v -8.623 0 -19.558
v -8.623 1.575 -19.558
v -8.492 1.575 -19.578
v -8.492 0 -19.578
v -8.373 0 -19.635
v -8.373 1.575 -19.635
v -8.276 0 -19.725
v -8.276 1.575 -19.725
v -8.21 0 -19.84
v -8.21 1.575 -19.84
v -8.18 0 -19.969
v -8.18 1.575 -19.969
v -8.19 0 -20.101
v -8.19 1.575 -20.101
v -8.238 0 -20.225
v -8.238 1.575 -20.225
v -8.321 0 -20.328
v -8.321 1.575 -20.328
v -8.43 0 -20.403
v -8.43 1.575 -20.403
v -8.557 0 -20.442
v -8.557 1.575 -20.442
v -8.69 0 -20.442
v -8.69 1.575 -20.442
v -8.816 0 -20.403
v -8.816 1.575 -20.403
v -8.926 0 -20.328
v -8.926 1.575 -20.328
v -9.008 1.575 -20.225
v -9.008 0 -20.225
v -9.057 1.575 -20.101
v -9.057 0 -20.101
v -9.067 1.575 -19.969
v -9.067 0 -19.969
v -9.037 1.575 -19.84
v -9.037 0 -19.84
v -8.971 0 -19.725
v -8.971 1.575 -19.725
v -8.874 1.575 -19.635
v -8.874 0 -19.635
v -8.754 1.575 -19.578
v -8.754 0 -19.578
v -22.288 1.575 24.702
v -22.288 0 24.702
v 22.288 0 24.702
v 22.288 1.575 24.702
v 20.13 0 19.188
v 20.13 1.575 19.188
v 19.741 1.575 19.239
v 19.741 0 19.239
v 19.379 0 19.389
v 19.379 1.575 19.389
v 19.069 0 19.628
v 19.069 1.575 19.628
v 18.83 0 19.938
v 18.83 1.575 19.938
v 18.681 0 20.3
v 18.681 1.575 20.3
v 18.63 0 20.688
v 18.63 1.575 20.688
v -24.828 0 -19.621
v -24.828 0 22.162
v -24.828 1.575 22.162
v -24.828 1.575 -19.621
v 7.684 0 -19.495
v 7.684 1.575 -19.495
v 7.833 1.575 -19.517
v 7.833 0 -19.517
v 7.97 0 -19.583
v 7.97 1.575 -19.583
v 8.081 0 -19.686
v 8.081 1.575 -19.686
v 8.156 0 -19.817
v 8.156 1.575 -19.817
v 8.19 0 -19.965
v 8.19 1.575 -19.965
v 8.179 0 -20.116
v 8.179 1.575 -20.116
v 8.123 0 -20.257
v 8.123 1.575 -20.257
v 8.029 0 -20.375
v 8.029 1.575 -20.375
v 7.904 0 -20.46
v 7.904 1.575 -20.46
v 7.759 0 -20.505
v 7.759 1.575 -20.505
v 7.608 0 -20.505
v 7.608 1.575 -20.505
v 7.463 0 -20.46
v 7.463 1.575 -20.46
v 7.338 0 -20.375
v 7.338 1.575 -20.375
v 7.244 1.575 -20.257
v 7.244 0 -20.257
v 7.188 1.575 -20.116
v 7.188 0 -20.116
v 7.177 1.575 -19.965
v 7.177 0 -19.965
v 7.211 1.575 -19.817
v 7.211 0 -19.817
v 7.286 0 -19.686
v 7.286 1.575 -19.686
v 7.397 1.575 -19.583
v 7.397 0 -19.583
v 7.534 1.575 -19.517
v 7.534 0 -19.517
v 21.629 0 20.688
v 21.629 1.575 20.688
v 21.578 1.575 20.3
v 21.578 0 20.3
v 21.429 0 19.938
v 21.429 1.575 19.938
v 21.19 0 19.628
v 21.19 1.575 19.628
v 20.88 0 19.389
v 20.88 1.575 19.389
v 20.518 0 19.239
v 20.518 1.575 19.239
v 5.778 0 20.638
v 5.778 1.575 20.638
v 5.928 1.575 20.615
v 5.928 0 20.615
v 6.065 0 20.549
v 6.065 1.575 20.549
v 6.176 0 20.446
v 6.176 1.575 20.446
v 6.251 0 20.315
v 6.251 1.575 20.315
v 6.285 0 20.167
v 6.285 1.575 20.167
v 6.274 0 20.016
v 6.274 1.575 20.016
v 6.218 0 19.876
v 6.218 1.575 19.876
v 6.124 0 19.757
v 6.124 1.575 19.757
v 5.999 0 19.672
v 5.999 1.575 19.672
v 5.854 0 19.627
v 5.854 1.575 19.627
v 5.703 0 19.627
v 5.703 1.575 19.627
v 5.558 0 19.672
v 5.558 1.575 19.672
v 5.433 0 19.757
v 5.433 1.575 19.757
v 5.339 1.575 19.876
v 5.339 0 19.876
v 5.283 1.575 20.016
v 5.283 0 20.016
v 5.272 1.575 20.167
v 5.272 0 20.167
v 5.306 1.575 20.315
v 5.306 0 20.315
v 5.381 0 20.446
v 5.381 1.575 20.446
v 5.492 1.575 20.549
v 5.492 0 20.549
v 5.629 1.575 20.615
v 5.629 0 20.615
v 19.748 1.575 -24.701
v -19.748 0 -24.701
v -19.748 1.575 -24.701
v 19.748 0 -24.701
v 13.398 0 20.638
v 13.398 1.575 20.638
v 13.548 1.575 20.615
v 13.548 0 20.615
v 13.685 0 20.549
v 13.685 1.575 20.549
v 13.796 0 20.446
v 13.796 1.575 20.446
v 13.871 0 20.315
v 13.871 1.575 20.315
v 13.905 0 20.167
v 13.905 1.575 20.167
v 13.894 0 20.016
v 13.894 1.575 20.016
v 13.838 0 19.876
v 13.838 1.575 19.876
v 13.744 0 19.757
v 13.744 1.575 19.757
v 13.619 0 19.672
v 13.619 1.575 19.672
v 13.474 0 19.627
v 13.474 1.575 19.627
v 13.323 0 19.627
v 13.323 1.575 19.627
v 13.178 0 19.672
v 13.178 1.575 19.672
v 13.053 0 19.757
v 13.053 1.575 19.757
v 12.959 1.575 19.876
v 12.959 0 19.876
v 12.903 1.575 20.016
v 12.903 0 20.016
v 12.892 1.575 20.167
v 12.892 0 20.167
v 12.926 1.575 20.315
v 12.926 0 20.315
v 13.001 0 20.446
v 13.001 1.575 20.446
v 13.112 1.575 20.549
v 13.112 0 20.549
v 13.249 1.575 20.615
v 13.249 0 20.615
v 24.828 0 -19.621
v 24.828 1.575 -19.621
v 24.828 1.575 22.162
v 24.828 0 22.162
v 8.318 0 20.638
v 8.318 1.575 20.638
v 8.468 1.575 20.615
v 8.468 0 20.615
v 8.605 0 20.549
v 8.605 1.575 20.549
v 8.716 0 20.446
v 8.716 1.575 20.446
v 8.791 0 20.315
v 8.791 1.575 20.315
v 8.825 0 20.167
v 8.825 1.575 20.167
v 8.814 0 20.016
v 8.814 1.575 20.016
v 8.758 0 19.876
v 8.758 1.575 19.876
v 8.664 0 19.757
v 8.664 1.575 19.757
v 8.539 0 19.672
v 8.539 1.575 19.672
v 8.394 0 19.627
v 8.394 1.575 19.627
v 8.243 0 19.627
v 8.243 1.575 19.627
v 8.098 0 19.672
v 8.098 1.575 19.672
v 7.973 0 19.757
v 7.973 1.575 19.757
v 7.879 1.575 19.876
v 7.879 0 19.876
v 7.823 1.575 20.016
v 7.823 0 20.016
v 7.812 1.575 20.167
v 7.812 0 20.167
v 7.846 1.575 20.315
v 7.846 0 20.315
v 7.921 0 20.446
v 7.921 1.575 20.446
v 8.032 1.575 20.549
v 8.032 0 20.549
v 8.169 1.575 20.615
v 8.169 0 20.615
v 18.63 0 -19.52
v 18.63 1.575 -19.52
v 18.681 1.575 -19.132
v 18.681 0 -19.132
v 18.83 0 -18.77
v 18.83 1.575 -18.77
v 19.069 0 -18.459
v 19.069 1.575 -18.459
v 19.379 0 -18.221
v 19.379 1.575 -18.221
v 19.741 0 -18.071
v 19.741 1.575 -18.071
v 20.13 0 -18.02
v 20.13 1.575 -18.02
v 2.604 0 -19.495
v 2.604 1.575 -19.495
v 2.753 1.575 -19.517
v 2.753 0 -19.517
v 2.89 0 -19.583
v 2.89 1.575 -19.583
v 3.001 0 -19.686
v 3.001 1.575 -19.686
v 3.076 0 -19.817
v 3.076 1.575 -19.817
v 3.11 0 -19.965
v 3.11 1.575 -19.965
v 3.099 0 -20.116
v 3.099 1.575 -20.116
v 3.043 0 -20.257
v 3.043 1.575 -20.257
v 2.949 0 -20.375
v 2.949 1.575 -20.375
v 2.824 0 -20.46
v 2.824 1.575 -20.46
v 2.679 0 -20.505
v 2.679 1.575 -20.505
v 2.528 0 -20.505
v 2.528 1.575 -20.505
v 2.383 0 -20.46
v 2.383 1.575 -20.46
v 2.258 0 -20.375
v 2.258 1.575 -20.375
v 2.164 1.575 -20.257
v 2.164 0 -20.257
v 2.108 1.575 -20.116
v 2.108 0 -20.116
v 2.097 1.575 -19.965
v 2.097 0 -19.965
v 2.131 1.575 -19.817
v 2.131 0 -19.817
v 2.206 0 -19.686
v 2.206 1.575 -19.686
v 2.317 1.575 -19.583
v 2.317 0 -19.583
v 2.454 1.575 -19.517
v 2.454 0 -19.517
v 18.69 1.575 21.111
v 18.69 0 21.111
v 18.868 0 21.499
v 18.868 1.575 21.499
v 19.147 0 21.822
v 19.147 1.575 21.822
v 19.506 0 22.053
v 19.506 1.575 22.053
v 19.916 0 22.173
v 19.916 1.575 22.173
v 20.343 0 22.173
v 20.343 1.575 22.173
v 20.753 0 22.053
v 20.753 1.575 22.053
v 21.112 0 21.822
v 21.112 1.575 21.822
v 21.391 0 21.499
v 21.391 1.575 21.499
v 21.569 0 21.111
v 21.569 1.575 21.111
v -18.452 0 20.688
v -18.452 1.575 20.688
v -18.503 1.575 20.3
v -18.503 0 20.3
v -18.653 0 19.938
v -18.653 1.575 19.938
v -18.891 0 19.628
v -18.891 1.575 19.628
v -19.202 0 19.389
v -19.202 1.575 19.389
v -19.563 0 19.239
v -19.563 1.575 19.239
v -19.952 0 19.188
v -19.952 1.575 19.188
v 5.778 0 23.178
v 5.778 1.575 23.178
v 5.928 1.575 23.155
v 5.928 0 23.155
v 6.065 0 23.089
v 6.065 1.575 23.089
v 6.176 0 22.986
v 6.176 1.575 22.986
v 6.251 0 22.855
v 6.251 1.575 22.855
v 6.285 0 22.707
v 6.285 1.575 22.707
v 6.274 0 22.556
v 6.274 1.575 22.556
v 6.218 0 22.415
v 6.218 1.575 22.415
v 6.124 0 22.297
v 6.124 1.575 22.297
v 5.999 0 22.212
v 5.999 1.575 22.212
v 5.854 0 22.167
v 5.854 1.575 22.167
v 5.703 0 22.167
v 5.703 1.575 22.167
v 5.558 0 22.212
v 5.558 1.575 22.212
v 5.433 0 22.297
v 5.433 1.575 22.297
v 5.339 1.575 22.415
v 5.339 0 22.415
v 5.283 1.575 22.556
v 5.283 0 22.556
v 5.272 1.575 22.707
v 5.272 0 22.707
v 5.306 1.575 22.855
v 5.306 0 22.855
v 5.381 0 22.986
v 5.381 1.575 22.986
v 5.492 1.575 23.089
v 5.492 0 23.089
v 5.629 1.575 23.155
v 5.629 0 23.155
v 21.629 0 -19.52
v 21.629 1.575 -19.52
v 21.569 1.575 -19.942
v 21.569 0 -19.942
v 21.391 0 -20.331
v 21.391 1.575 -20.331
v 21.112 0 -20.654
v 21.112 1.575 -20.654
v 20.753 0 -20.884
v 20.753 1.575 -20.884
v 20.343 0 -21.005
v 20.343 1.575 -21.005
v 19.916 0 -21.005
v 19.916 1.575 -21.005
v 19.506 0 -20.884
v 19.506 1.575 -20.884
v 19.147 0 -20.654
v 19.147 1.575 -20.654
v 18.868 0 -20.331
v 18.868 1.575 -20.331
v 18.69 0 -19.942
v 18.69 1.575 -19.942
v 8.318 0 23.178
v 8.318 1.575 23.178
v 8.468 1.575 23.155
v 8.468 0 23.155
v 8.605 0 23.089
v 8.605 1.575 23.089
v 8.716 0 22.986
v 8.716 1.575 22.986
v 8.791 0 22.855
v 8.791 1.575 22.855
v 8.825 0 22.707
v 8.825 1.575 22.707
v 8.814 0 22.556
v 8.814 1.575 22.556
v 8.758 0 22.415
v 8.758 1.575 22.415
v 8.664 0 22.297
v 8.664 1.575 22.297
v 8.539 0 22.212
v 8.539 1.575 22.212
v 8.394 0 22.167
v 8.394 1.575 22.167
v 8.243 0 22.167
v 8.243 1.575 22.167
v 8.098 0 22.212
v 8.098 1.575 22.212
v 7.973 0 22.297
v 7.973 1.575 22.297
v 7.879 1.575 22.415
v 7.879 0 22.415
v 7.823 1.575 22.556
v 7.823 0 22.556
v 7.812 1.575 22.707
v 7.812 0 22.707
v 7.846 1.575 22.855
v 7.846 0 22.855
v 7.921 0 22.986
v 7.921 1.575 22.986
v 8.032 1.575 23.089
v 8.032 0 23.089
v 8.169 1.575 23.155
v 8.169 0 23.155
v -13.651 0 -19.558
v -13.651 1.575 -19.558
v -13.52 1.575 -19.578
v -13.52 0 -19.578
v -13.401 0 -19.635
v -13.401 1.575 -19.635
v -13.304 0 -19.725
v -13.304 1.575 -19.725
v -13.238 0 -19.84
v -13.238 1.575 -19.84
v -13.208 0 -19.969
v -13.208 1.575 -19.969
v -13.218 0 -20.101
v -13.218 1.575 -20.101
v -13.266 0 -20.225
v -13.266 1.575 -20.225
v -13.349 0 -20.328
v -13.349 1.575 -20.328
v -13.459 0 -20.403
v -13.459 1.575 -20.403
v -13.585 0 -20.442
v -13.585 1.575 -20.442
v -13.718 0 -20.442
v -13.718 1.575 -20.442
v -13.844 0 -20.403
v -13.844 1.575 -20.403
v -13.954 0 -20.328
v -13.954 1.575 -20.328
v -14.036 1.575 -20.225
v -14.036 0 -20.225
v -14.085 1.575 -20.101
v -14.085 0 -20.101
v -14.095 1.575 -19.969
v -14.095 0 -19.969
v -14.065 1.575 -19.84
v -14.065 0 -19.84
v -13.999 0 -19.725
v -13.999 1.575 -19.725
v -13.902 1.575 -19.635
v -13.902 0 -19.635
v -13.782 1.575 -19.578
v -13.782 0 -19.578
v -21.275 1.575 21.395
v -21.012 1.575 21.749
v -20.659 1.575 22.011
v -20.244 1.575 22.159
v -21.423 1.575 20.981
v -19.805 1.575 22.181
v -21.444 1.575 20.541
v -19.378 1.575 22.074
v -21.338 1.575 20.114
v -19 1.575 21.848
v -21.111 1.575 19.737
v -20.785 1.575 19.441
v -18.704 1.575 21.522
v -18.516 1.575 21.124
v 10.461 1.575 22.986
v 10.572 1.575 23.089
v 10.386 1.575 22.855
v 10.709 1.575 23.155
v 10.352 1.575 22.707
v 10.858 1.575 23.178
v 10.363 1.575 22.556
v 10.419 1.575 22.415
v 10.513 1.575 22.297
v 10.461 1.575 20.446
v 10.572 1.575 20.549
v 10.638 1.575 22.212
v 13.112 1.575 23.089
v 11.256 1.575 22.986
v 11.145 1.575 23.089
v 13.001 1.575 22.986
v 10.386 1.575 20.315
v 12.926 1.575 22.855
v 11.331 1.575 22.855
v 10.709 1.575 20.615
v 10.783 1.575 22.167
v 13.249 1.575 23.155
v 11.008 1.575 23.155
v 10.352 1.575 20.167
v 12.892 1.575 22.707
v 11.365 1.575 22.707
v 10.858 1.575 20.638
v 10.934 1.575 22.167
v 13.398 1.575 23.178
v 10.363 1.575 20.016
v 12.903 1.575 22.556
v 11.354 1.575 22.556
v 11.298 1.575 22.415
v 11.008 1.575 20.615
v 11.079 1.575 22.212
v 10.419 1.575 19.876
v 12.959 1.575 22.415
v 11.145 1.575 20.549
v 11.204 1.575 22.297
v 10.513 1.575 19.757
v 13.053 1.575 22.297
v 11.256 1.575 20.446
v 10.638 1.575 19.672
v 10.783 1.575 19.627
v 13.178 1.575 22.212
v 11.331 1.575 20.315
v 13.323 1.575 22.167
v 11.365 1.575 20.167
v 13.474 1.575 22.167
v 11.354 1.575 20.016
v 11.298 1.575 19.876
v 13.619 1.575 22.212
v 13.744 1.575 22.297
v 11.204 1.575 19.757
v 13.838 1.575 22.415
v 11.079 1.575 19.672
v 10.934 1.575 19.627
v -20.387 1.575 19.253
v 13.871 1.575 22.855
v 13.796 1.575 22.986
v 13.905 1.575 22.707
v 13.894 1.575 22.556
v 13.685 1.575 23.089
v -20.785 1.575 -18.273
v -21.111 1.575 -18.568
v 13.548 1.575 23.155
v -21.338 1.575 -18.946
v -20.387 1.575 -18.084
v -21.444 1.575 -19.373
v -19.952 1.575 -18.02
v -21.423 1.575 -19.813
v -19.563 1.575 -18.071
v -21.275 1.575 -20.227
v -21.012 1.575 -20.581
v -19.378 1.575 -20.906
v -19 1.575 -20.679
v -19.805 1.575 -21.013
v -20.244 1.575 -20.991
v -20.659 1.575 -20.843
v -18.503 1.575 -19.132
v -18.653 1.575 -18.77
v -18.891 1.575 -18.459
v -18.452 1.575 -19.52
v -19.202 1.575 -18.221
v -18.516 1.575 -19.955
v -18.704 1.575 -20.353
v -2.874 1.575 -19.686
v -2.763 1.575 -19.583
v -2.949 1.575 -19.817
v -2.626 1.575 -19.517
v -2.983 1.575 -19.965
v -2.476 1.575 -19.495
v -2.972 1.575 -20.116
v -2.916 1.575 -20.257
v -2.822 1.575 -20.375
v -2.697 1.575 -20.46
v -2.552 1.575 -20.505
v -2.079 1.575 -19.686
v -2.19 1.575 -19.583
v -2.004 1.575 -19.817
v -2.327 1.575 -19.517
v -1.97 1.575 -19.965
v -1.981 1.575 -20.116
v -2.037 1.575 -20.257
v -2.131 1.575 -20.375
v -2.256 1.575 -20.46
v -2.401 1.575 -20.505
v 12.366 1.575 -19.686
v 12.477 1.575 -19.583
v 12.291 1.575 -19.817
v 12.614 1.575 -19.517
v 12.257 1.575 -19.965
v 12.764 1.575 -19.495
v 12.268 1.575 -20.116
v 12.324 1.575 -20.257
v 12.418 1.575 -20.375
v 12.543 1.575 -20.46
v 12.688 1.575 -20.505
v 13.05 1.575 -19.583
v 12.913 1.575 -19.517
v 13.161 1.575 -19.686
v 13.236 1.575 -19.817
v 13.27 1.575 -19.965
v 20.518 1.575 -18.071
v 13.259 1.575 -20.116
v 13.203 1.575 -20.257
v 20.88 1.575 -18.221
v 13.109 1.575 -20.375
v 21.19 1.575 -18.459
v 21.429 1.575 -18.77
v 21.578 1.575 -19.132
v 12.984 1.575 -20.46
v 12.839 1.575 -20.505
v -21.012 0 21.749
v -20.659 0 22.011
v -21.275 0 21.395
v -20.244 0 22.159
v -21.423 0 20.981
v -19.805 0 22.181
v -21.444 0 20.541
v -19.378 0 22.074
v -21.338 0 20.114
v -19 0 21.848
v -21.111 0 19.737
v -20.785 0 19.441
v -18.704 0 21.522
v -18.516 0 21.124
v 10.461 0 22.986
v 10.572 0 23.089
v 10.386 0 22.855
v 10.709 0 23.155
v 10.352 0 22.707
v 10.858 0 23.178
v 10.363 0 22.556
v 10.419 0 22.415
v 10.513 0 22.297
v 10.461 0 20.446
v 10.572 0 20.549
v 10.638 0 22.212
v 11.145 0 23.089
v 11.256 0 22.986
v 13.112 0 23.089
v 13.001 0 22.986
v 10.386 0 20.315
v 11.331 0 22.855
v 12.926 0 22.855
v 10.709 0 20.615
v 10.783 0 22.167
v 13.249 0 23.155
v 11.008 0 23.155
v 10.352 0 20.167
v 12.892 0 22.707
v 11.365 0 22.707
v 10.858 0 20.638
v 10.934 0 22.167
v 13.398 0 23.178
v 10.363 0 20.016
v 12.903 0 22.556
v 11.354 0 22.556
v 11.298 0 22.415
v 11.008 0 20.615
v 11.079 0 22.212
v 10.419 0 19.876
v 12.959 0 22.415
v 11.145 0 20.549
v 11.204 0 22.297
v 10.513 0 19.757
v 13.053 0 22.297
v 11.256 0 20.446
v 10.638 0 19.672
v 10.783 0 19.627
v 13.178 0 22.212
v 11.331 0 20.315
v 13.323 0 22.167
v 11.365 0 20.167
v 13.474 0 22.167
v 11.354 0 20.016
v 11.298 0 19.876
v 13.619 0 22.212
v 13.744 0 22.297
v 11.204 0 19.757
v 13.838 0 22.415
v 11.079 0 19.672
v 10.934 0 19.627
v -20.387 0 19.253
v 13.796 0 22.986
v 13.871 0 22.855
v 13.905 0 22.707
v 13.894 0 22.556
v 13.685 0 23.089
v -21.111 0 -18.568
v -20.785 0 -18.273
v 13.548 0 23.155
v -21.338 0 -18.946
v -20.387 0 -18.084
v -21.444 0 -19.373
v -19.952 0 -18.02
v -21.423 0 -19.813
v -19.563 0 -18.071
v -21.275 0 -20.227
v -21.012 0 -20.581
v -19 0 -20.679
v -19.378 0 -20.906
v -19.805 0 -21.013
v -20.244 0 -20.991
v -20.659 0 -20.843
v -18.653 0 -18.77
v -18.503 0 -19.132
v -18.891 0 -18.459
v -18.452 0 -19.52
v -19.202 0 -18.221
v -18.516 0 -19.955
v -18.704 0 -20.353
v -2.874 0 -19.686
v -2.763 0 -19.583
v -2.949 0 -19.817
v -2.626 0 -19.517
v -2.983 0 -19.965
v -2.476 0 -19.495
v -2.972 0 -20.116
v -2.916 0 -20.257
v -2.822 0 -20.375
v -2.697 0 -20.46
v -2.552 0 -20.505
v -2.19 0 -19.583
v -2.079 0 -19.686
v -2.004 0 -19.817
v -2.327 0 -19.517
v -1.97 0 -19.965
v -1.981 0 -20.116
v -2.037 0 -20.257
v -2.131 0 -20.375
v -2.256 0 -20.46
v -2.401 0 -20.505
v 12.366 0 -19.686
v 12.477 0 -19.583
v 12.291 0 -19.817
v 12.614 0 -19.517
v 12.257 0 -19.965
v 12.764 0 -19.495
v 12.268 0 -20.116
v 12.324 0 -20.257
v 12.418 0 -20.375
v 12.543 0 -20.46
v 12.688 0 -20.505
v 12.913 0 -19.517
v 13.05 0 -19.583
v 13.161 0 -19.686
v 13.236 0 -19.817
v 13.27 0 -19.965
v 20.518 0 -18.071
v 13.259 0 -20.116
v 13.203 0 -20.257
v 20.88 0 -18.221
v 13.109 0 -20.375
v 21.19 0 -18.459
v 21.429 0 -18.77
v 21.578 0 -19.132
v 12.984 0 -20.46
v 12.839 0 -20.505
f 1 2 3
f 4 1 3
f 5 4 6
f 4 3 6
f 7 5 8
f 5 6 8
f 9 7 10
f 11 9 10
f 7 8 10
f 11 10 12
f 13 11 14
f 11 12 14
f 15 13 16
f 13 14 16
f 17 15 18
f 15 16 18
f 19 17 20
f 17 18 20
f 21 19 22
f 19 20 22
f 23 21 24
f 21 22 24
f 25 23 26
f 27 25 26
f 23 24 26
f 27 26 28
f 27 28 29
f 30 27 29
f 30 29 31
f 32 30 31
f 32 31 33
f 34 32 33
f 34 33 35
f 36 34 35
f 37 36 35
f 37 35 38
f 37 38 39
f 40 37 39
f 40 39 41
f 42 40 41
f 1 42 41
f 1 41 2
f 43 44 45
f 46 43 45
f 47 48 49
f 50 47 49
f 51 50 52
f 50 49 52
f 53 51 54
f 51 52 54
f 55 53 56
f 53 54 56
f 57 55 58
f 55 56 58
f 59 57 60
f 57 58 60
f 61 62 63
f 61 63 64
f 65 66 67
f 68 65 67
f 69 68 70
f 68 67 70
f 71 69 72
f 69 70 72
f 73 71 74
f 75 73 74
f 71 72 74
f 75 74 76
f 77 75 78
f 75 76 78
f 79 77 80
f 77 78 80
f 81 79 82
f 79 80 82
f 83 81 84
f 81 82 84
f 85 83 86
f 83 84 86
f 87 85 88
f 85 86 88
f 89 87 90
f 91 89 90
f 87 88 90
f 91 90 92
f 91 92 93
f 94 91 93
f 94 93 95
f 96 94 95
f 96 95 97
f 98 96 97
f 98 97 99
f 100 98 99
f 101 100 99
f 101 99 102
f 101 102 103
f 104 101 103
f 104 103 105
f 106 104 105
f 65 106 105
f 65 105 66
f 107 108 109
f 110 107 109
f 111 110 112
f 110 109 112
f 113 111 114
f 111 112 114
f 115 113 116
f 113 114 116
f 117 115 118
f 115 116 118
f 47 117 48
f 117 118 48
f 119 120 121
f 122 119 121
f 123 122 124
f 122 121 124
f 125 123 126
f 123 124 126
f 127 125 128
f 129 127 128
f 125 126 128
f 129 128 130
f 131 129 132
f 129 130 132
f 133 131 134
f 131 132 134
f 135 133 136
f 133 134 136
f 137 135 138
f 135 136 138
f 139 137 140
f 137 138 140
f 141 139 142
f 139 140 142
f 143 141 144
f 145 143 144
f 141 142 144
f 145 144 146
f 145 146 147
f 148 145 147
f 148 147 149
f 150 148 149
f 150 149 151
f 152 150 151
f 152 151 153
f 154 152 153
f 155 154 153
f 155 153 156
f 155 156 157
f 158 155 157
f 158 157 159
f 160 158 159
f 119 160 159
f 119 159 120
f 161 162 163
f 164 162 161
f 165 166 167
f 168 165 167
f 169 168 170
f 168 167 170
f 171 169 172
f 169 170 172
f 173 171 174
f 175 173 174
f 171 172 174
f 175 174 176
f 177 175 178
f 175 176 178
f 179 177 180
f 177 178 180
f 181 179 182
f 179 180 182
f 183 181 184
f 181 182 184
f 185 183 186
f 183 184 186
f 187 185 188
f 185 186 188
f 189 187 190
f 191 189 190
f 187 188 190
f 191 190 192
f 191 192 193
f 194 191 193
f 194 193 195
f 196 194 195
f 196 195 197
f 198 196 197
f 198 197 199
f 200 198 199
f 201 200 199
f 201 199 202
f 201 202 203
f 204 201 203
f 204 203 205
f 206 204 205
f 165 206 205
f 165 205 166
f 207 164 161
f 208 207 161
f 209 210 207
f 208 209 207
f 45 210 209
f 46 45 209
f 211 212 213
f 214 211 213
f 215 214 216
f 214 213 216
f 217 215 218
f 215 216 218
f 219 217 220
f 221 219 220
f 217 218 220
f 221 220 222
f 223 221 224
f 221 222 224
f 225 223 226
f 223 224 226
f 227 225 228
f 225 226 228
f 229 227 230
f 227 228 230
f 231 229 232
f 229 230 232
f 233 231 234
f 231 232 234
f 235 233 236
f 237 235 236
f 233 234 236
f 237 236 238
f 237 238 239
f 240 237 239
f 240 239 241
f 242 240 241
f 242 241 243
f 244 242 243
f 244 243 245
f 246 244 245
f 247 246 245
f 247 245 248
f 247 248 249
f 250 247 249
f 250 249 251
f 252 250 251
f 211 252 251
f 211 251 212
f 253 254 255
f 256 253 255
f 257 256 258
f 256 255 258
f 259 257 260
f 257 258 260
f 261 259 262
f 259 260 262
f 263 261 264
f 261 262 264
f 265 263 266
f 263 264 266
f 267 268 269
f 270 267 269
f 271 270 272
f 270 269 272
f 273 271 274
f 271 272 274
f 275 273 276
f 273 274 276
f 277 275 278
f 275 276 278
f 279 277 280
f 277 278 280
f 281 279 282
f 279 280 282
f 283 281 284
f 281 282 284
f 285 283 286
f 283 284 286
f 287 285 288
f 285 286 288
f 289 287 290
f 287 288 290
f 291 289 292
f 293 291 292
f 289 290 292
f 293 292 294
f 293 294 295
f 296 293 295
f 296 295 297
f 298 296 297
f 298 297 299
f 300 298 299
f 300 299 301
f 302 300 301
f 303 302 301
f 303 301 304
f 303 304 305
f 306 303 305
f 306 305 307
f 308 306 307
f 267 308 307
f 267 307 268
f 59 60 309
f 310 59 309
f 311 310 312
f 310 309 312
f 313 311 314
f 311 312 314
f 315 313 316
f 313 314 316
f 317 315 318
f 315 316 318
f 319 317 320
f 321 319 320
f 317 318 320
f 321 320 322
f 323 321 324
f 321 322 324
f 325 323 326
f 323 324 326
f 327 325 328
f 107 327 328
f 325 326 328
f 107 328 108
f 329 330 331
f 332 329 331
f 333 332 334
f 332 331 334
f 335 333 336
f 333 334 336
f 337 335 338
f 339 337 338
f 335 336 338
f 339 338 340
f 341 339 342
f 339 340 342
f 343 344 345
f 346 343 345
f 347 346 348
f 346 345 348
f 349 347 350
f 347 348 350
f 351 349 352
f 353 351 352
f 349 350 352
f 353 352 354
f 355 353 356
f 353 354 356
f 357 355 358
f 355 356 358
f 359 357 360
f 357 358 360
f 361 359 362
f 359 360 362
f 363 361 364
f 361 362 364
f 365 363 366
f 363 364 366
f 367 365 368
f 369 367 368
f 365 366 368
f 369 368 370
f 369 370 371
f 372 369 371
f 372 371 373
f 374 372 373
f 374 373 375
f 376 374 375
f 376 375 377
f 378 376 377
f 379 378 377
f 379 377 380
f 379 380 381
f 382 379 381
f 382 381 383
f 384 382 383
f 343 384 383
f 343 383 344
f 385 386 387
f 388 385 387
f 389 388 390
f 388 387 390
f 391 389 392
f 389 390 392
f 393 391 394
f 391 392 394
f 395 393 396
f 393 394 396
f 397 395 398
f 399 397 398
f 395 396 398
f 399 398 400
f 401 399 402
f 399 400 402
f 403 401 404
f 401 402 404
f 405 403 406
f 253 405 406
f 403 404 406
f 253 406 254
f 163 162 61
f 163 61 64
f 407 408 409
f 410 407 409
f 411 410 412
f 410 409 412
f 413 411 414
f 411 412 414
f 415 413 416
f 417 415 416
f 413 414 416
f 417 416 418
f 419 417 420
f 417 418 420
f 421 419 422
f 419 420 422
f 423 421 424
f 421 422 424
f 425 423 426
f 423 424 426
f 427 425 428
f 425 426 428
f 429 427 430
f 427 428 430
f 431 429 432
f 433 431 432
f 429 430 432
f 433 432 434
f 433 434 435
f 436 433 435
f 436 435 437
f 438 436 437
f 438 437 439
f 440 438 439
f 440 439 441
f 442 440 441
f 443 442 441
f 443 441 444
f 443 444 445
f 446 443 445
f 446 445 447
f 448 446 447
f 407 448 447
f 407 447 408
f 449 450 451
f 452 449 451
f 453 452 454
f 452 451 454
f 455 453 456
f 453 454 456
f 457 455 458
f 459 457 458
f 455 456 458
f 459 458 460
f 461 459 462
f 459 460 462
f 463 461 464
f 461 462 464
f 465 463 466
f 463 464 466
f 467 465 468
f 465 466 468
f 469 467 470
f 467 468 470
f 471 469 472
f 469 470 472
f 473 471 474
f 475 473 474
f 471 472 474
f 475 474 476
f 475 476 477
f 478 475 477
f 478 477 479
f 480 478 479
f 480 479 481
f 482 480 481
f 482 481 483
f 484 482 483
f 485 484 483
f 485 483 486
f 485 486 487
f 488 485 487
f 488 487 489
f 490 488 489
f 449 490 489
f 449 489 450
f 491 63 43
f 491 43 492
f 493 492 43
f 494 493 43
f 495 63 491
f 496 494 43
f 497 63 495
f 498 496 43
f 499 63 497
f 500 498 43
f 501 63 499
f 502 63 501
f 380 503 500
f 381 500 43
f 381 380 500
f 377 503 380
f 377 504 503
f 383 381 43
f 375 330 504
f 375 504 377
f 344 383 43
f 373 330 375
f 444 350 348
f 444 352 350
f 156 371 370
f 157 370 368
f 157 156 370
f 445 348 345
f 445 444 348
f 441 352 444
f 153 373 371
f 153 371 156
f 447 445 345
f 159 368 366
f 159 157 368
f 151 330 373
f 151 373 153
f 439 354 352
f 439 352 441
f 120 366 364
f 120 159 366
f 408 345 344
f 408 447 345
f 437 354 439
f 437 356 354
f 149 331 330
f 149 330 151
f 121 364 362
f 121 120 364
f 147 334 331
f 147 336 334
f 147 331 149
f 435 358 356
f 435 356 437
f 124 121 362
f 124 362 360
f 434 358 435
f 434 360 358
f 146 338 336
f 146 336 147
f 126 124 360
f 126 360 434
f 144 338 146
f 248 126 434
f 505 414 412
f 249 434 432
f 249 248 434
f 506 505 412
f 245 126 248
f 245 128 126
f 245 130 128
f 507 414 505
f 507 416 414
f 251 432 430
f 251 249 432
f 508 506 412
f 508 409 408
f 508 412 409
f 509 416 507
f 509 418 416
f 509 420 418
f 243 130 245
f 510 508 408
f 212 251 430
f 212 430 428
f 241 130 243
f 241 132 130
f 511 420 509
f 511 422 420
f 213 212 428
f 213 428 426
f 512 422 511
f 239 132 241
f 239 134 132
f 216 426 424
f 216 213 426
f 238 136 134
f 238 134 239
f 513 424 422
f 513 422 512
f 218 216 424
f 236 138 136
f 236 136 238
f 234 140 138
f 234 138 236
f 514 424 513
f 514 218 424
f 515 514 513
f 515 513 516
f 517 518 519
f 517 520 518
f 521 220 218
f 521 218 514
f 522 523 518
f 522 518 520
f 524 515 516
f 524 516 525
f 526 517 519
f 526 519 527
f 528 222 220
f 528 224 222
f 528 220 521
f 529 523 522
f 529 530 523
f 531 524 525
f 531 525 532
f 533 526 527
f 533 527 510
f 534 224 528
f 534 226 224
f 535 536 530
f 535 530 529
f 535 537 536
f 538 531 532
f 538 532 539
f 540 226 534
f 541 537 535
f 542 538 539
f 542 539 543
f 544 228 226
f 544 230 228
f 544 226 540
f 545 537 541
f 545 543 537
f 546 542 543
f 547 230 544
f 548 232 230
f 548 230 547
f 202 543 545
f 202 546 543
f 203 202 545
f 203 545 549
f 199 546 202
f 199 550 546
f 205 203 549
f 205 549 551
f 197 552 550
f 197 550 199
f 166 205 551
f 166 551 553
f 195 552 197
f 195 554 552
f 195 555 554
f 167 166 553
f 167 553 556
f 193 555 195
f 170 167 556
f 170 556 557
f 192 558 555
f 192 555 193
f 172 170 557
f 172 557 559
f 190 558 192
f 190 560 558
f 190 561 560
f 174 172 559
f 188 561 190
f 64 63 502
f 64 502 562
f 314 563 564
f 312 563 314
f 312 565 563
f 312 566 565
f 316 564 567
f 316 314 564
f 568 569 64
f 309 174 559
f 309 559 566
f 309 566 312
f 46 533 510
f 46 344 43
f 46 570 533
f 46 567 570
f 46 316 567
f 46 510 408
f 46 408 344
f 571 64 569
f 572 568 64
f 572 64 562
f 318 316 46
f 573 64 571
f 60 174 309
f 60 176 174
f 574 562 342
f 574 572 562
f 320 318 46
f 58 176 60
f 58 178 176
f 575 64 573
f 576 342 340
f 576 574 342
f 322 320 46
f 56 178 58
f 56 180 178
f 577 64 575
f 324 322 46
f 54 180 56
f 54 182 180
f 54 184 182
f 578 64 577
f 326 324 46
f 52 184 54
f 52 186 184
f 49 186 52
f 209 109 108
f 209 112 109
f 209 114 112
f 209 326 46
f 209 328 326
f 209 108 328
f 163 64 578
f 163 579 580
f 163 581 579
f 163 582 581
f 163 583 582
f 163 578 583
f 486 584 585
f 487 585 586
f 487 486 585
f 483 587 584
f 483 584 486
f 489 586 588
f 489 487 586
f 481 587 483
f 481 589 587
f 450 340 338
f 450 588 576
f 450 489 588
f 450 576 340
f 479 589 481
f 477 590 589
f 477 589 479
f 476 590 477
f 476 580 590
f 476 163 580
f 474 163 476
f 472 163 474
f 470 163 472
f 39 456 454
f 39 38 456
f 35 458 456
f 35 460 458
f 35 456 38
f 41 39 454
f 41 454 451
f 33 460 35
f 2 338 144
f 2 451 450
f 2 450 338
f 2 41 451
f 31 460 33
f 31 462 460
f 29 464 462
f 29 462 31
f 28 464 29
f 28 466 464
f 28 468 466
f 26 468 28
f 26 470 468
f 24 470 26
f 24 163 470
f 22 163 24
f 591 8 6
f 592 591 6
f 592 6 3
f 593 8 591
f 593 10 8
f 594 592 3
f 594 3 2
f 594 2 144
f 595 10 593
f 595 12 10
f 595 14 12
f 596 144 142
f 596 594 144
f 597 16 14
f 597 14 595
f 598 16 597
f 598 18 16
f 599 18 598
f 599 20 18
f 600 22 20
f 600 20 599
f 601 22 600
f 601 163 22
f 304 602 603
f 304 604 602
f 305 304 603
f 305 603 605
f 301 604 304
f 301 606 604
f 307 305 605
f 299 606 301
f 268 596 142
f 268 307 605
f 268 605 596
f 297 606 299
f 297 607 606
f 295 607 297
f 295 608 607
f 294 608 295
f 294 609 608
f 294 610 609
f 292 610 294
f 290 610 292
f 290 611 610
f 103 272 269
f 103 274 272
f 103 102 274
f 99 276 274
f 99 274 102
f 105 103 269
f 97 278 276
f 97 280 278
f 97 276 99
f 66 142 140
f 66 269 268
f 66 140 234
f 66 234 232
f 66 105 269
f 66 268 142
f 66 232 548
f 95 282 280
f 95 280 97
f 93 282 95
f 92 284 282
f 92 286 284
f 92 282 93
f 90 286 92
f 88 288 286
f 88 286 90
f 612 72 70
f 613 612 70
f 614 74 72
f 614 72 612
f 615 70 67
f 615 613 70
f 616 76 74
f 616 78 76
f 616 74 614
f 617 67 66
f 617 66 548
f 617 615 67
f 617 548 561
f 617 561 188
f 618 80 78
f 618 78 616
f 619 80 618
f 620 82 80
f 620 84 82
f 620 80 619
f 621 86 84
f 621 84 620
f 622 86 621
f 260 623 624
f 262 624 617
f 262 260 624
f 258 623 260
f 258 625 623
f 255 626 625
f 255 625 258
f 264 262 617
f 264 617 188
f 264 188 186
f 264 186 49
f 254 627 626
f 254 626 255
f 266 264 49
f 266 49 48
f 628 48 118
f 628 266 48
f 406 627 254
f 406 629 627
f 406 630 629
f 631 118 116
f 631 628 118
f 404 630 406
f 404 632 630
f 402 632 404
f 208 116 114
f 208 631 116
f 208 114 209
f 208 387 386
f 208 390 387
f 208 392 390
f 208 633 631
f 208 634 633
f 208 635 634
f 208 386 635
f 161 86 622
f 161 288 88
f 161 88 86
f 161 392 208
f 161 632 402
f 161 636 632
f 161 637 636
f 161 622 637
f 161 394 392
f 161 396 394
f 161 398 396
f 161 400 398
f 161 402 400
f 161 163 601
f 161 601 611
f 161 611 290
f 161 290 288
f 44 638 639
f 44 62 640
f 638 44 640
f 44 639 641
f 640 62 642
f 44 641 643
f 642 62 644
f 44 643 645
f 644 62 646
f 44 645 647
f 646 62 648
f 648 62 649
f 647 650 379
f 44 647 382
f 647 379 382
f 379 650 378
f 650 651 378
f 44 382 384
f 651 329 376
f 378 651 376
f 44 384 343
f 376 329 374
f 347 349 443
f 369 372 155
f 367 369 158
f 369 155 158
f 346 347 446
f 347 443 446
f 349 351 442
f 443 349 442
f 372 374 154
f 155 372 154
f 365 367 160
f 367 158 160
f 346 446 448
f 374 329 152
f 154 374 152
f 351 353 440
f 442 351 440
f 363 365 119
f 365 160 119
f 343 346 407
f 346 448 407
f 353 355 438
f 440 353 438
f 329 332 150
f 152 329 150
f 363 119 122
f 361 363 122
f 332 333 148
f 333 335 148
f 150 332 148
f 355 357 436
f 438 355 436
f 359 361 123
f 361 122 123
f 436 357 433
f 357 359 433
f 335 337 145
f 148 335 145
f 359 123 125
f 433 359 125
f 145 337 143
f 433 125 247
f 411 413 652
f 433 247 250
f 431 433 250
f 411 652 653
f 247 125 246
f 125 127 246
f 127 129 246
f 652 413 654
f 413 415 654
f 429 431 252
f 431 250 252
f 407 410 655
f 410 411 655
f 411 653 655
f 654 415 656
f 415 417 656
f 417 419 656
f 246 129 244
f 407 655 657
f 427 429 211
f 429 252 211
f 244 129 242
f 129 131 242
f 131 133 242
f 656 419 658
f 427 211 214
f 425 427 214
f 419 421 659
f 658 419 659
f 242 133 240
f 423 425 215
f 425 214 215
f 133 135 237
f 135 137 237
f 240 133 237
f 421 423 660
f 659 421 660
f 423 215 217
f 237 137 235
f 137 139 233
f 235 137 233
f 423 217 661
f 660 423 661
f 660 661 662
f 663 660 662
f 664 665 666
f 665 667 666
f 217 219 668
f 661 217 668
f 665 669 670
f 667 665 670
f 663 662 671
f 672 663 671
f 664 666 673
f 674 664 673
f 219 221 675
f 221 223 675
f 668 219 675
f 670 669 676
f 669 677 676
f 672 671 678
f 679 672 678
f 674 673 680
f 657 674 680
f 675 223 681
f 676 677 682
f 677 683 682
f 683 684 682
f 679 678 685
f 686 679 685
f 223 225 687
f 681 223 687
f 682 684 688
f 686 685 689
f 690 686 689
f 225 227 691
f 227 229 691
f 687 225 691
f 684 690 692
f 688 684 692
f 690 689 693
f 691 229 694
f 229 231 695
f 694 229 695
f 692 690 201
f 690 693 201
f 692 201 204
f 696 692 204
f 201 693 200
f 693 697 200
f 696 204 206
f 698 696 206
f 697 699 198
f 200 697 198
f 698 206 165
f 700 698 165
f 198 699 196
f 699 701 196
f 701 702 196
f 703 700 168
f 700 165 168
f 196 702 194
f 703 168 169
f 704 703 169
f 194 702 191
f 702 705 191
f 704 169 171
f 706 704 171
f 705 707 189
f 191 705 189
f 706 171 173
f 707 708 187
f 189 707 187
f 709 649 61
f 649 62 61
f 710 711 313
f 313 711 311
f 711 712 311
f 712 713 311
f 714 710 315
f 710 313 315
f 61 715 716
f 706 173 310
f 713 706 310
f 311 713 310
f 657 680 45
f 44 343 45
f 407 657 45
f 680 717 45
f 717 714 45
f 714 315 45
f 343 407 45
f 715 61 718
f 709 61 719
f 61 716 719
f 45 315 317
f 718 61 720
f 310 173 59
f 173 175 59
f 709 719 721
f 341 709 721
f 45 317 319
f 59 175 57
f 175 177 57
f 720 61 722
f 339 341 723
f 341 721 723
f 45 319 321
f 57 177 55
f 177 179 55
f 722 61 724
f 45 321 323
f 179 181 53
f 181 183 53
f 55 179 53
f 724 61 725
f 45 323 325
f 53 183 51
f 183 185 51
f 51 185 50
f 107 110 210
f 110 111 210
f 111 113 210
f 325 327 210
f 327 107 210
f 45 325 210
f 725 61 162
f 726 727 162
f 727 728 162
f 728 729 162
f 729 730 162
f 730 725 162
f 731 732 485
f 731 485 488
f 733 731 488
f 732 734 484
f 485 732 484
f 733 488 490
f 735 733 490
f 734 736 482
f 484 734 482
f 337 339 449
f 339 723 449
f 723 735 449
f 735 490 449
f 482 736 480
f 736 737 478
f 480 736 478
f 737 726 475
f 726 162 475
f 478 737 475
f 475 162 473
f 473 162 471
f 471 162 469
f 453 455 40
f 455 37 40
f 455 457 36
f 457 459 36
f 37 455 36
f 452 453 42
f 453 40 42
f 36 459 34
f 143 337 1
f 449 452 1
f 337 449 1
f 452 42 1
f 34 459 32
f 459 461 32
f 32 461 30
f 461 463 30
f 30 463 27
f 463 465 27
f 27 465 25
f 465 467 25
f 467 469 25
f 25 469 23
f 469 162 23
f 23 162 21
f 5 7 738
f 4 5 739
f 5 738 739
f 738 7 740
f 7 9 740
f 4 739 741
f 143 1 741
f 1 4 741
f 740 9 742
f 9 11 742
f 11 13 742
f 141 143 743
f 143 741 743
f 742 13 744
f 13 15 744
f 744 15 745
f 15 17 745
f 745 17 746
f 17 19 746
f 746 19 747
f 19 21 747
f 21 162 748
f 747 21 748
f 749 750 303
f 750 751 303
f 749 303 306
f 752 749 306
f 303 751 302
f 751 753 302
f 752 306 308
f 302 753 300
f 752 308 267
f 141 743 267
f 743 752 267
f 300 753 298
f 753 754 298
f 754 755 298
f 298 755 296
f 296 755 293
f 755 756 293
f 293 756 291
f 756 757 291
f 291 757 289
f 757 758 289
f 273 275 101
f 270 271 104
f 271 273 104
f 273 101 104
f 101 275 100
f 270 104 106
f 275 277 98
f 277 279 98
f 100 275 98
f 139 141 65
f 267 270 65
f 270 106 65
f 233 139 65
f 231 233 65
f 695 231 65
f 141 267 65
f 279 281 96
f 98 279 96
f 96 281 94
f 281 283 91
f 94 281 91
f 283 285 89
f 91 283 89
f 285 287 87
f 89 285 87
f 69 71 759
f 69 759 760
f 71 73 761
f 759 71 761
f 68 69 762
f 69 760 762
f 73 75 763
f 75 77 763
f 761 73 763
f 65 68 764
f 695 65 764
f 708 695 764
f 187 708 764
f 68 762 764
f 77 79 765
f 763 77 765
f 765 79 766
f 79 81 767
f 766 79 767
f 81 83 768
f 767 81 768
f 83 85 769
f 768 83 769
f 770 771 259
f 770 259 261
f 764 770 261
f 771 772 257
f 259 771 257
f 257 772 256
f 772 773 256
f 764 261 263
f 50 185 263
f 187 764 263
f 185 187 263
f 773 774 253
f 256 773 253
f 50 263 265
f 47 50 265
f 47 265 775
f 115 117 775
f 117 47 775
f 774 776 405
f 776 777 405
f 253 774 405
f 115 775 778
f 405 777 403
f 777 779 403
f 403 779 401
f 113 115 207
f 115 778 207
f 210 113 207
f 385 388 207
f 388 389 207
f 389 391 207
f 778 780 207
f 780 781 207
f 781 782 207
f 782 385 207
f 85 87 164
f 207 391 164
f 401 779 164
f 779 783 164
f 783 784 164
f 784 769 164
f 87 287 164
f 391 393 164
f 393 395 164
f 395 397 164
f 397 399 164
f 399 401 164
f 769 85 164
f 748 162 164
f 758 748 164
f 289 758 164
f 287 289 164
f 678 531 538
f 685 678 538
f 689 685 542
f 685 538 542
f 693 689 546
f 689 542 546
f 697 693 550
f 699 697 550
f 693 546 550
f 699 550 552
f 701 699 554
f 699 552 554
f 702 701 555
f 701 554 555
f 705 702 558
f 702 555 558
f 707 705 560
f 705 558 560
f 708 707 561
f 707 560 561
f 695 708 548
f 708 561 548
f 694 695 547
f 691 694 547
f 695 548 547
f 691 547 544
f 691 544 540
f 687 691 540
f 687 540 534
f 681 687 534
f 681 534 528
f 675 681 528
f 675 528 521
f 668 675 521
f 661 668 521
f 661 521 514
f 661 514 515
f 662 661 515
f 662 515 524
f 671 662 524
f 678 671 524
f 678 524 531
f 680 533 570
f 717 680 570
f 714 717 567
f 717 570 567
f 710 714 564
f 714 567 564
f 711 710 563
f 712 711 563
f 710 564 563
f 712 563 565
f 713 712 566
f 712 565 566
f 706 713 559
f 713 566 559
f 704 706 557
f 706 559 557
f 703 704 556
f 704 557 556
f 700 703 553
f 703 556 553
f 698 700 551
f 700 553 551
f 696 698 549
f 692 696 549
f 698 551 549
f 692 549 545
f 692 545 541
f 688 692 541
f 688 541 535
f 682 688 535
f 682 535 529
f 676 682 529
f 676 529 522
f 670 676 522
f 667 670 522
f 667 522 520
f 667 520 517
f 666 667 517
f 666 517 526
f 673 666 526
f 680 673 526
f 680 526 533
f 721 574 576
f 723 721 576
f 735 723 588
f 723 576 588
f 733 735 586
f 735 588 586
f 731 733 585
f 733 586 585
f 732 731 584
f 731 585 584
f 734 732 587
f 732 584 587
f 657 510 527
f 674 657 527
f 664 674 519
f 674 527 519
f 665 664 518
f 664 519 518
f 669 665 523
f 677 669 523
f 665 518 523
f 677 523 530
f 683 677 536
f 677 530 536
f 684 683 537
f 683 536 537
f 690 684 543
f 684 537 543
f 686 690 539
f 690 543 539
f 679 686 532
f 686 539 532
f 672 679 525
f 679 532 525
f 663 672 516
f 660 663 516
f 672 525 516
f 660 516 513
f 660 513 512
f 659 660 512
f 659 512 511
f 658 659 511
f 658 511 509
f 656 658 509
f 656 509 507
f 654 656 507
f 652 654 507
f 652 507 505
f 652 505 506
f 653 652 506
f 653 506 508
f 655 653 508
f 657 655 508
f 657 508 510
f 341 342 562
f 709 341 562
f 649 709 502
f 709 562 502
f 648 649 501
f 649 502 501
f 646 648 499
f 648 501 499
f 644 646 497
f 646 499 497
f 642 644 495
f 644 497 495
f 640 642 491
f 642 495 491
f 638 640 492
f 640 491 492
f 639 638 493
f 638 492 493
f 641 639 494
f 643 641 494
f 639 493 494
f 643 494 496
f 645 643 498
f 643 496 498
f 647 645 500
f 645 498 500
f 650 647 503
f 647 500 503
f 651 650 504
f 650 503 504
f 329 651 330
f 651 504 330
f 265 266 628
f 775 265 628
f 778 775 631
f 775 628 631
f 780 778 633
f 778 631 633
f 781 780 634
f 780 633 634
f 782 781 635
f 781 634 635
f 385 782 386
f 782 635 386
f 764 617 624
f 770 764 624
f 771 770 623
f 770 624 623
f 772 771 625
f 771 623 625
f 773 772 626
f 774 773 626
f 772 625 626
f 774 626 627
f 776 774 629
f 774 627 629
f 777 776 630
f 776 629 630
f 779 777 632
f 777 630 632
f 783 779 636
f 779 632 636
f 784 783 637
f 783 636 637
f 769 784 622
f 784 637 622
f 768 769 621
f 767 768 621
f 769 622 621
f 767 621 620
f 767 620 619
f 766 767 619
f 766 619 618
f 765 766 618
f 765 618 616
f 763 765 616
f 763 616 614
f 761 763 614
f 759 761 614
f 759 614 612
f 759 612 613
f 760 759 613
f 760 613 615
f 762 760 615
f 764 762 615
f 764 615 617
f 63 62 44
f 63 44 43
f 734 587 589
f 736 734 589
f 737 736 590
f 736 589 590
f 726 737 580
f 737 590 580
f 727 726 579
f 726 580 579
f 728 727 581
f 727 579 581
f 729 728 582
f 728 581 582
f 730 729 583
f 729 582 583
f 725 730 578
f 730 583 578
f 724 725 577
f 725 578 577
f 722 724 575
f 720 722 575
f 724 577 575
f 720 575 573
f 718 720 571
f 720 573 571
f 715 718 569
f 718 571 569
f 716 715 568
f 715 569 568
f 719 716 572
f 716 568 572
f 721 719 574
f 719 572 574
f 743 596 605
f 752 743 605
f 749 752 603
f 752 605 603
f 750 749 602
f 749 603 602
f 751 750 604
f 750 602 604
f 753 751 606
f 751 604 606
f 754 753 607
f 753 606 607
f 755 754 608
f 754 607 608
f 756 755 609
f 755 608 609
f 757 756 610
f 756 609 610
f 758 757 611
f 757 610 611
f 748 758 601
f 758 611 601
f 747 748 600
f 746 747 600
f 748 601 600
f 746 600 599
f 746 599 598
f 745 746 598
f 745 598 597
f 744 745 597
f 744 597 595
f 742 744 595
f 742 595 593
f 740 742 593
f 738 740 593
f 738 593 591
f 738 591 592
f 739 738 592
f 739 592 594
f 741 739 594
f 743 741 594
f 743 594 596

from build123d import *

# Parameters (mm, degrees)
SKETCH1_W           = 49.657
SKETCH1_H           = 49.403
BOSS_EXTRUDE1_DEPTH = 1.5748
CHAMFER1_SIZE       = 5.08
CHAMFER2_SIZE       = 2.54
SKETCH2_R           = 1.5
SKETCH2_R_2         = 0.508
CUT_EXTRUDE1_DEPTH  = 36.058501245
SKETCH3_R           = 0.508
SKETCH3_R_2         = 0.4445
CUT_EXTRUDE2_DEPTH  = 2.54


with BuildPart() as part:
    # Sketch1 → Boss-Extrude1 (new body)
    with BuildSketch(Plane(origin=(0, 0, 0), x_dir=(1, 0, 0), z_dir=(0, 1, 0))):
        Rectangle(SKETCH1_W, SKETCH1_H)
    extrude(amount=BOSS_EXTRUDE1_DEPTH)

    # Chamfer1
    chamfer1_edges = [part.edges().sort_by_distance(p)[0] for p in [
        (-24.8285, 0.7874, -24.7015),
        (24.8285, 0.7874, -24.7015),
    ]]
    chamfer(chamfer1_edges, length=CHAMFER1_SIZE)

    # Chamfer2
    chamfer2_edges = [part.edges().sort_by_distance(p)[0] for p in [
        (24.8285, 0.7874, 24.7015),
        (-24.8285, 0.7874, 24.7015),
    ]]
    chamfer(chamfer2_edges, length=CHAMFER2_SIZE)

    # Sketch2 → Cut-Extrude1 (cut, through all)
    with BuildSketch(Plane(origin=(0, 1.5748, 0), x_dir=(1, 0, 0), z_dir=(0, 1, 0))):
        with Locations((-19.9517, -20.6883)):
            Circle(SKETCH2_R)
        with Locations((20.1295, -20.6883)):
            Circle(SKETCH2_R)
        with Locations((-19.9517, 19.5199)):
            Circle(SKETCH2_R)
        with Locations((20.1295, 19.5199)):
            Circle(SKETCH2_R)
        with Locations((5.7785, -22.6695)):
            Circle(SKETCH2_R_2)
        with Locations((8.3185, -22.6695)):
            Circle(SKETCH2_R_2)
        with Locations((10.8585, -22.6695)):
            Circle(SKETCH2_R_2)
        with Locations((13.3985, -22.6695)):
            Circle(SKETCH2_R_2)
        with Locations((8.3185, -20.1295)):
            Circle(SKETCH2_R_2)
        with Locations((10.8585, -20.1295)):
            Circle(SKETCH2_R_2)
        with Locations((13.3985, -20.1295)):
            Circle(SKETCH2_R_2)
        with Locations((5.7785, -20.1295)):
            Circle(SKETCH2_R_2)
    extrude(amount=-CUT_EXTRUDE1_DEPTH, mode=Mode.SUBTRACT)

    # Sketch3 → Cut-Extrude2 (cut)
    with BuildSketch(Plane(origin=(0, 1.5748, 0), x_dir=(1, 0, 0), z_dir=(0, 1, 0))):
        with Locations((12.7635, 20.0025)):
            Circle(SKETCH3_R)
        with Locations((7.6835, 20.0025)):
            Circle(SKETCH3_R)
        with Locations((2.6035, 20.0025)):
            Circle(SKETCH3_R)
        with Locations((-2.4765, 20.0025)):
            Circle(SKETCH3_R)
        with Locations((-8.6233, 20.0025)):
            Circle(SKETCH3_R_2)
        with Locations((-13.65137741, 20.0025)):
            Circle(SKETCH3_R_2)
    extrude(amount=-CUT_EXTRUDE2_DEPTH, mode=Mode.SUBTRACT)


solid = part.part
